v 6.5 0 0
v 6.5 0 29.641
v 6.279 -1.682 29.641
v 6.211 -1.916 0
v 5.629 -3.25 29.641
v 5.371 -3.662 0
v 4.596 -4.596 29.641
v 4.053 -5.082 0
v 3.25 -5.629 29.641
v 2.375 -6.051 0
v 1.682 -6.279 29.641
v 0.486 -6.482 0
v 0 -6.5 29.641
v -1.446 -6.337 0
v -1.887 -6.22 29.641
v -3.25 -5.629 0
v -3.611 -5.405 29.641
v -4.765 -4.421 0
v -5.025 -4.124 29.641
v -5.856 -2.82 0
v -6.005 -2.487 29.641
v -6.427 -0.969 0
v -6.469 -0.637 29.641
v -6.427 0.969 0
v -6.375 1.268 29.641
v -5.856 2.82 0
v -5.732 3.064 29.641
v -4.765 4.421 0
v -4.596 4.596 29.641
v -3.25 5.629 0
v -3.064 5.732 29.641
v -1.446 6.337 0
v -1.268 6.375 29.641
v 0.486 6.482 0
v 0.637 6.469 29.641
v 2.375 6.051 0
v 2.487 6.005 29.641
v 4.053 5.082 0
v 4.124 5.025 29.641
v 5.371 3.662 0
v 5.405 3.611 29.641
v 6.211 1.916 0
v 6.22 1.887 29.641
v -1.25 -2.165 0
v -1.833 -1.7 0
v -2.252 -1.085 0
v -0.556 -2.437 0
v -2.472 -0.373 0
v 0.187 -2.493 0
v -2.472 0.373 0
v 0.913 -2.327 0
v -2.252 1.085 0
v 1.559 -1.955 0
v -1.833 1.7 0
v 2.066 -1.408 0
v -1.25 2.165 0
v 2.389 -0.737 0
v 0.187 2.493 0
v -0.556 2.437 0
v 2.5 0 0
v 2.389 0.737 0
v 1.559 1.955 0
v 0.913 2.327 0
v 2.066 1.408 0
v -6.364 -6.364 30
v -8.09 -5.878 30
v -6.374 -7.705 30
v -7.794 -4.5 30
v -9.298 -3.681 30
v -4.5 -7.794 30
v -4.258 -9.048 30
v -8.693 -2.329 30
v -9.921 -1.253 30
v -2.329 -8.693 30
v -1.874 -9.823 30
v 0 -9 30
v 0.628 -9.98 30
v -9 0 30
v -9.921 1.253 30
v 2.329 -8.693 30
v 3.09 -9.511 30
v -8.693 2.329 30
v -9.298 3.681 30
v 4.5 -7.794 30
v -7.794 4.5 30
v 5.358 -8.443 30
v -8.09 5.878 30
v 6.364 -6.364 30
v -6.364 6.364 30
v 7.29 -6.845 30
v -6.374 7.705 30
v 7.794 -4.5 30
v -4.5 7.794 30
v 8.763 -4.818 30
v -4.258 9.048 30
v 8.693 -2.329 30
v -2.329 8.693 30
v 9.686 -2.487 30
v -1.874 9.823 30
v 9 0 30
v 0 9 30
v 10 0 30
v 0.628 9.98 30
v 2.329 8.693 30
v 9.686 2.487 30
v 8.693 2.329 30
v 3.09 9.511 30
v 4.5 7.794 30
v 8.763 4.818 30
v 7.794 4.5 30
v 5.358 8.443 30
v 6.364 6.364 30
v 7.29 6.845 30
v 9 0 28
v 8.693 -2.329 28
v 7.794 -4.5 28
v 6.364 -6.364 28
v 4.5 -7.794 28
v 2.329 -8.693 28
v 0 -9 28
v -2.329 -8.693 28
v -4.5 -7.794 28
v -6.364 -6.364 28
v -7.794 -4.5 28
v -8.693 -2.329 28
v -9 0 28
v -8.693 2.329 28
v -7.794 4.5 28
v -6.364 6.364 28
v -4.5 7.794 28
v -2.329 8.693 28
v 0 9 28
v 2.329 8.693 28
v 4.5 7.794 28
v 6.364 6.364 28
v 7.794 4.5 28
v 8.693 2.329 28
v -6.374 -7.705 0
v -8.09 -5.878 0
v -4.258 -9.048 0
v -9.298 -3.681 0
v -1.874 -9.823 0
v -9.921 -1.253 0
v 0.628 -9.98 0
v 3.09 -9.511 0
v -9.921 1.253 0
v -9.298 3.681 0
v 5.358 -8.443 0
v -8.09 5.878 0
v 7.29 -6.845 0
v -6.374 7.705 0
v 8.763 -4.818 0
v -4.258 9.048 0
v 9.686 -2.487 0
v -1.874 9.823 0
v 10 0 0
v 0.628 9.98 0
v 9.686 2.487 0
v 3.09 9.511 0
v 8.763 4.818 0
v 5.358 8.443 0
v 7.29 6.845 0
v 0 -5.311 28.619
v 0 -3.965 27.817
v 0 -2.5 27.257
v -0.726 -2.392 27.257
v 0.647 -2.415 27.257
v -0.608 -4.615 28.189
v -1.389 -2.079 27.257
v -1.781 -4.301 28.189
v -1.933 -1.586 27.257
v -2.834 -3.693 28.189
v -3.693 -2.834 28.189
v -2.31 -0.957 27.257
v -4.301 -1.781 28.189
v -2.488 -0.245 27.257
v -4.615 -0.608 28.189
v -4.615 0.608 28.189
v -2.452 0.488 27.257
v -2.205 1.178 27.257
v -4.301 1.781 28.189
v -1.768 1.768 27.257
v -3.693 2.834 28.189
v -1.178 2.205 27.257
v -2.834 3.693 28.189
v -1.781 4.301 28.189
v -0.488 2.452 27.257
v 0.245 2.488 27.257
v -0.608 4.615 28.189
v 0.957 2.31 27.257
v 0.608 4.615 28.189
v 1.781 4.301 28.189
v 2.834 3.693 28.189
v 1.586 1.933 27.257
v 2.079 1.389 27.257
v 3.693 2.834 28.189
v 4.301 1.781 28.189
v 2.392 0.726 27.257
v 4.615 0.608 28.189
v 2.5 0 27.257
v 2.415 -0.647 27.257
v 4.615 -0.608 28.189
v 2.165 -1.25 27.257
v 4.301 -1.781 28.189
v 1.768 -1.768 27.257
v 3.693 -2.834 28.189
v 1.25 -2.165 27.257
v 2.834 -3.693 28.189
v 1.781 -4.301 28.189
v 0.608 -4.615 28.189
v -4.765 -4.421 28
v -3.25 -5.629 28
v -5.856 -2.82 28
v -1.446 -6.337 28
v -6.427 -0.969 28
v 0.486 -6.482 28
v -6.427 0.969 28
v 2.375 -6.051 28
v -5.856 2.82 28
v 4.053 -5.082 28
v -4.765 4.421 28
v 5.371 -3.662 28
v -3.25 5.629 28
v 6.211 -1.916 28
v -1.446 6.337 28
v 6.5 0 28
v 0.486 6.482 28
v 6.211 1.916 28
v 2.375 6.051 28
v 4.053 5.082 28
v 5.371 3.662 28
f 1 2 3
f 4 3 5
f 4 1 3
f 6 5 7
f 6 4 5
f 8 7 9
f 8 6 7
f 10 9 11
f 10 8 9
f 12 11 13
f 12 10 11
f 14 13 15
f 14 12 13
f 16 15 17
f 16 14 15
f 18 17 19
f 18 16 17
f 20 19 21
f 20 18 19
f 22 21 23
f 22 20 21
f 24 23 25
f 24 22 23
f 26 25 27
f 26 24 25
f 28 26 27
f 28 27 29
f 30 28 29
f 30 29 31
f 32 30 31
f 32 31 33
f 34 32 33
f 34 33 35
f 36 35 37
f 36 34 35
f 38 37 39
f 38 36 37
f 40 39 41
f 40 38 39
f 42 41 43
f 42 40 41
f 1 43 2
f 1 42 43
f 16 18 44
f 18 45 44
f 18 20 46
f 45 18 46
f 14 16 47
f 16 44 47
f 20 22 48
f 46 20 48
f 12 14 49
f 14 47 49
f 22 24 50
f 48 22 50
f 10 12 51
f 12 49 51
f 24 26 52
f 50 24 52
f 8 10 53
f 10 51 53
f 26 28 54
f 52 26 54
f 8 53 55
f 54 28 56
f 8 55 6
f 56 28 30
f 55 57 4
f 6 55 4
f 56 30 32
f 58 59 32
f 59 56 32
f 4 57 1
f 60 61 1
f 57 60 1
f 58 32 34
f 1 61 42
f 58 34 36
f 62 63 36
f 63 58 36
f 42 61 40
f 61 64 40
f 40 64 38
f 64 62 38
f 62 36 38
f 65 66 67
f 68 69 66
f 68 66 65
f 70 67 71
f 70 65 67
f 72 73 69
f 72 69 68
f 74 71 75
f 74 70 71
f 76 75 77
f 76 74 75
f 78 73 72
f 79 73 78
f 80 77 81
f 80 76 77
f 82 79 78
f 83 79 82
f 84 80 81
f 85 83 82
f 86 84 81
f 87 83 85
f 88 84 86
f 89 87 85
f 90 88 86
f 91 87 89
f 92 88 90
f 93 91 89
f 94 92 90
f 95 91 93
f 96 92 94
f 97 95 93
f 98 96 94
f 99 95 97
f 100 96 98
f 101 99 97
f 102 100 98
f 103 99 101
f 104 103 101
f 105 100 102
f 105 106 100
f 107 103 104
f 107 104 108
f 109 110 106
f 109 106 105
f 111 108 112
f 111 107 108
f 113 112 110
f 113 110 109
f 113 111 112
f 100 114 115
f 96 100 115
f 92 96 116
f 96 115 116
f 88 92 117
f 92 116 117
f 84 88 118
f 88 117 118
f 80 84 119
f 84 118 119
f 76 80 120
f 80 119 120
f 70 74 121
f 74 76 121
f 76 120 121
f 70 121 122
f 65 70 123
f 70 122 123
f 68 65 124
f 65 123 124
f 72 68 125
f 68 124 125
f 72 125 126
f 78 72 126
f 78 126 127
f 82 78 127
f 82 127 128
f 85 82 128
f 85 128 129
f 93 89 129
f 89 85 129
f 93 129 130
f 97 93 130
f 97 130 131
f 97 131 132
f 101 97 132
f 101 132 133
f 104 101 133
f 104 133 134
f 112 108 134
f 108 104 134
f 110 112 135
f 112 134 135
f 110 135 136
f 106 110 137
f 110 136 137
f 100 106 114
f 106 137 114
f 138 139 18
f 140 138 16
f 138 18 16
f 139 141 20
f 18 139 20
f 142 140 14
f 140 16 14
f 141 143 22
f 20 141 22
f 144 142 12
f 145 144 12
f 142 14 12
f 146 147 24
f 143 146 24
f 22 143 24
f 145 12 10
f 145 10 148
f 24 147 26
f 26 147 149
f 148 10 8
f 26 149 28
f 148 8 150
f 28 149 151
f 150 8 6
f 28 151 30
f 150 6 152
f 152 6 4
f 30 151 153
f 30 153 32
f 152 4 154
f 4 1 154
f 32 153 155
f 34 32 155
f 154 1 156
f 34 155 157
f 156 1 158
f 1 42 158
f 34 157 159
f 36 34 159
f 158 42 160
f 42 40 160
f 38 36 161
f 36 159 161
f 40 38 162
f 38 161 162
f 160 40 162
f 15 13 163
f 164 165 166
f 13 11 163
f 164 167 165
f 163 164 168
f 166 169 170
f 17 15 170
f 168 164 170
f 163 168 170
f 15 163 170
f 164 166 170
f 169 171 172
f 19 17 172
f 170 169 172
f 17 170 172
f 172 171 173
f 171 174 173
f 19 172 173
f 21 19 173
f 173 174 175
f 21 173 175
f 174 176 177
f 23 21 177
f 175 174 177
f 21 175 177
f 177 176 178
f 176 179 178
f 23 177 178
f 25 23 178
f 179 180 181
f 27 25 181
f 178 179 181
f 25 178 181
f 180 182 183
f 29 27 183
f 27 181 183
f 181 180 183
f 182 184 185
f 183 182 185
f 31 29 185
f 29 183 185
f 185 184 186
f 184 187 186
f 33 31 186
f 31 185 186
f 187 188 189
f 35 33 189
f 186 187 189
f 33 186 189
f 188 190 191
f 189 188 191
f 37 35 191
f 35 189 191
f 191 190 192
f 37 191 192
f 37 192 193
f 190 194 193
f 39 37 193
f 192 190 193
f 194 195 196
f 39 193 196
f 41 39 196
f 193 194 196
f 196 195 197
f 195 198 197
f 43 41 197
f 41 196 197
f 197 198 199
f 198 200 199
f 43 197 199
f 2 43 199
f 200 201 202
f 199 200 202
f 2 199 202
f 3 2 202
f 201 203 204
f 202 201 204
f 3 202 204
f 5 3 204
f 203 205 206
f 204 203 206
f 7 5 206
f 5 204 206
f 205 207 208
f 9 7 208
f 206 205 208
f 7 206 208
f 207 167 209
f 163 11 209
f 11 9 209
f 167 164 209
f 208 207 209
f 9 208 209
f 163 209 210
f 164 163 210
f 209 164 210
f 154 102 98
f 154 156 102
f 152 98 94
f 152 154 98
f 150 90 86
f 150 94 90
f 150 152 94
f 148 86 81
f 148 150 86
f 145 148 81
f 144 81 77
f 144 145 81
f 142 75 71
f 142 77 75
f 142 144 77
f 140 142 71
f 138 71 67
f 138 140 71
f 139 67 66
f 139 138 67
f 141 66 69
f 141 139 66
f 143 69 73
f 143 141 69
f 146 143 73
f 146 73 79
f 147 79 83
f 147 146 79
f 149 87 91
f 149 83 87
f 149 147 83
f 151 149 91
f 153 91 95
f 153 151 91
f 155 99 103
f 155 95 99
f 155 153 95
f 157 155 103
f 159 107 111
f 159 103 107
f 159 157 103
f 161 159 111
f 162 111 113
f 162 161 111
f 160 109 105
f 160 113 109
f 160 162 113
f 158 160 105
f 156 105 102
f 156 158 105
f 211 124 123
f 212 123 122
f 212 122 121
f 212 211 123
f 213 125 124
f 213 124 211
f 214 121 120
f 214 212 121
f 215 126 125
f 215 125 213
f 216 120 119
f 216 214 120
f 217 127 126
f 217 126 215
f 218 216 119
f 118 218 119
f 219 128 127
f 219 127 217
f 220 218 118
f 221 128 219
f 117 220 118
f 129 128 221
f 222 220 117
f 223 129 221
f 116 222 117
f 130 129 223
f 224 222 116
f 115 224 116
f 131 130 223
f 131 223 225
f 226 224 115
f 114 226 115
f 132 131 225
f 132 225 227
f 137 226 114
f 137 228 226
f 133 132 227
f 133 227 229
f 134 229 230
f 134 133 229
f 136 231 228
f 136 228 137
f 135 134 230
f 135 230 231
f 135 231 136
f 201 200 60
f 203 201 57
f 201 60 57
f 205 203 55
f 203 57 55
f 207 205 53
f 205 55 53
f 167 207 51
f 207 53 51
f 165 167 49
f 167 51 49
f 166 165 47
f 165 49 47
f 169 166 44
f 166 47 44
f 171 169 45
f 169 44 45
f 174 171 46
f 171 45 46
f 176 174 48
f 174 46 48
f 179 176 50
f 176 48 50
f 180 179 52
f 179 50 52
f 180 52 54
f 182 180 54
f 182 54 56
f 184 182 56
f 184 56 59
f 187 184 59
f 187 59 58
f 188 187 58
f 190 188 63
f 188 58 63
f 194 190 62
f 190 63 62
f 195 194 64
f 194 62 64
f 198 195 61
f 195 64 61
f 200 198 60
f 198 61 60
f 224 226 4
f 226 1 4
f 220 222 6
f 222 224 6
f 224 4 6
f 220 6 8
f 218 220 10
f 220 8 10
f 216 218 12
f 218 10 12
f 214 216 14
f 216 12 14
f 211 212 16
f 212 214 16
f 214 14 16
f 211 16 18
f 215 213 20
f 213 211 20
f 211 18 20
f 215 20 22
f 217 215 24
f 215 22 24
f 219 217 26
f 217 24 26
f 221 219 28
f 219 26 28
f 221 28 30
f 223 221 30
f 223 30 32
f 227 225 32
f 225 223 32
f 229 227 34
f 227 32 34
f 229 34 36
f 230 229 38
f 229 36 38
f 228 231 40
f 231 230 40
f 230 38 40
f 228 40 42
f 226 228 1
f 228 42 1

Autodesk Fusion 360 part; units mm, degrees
sketch "Sketch1" plane through (0, 0, 0) normal (0, 0, 1) x (1, 0, 0)
  circle A0 centre (0, 0) radius 10
  circle A1 centre (0, 0) radius 9
  circle A2 centre (0, 0) radius 6.5
  circle A3 centre (0, 0) radius 2.5
  dimension "d1" = 20
  dimension "d2" = 18
  dimension "d3" = 13
  dimension "d8" = 5
extrude "Extrude1" add sketch "Sketch1" along normal blind 30 makes body 1 at (9.9503, -0.9957, 20) makes body 2 at (6.4677, -0.6472, 20)
extrude "Extrude2" add sketch "Sketch1" along normal blind 28 contours A1 bodies 1
sketch "Sketch2" plane through (0, 0, 0) normal (1, 0, 0) x (0, 0, -1)
  circle A0 centre (-30, 7.5) radius 1.5
  arc A1 (-36, -9.093) -> (-26.907, 0) centre (-36, 0) ccw
  line L0 (-1.75, 0) -> (-22.5, 0)
  line L1 (-26.907, 0) -> (-36, 0)
  line L2 (-36, 0) -> (-36, -9.093)
  dimension "d10" = 3
  dimension "d11" = 7.5
  dimension "d13" = 36
revolve "Revolve1" cut sketch "Sketch2" angle 360 about axis through (0, 0, 1.75) along (0, 0, 1) contours A1 L1 L2 bodies 2
equation "d8 = stepperaxis"
equation "stepperaxis = 5 mm"
